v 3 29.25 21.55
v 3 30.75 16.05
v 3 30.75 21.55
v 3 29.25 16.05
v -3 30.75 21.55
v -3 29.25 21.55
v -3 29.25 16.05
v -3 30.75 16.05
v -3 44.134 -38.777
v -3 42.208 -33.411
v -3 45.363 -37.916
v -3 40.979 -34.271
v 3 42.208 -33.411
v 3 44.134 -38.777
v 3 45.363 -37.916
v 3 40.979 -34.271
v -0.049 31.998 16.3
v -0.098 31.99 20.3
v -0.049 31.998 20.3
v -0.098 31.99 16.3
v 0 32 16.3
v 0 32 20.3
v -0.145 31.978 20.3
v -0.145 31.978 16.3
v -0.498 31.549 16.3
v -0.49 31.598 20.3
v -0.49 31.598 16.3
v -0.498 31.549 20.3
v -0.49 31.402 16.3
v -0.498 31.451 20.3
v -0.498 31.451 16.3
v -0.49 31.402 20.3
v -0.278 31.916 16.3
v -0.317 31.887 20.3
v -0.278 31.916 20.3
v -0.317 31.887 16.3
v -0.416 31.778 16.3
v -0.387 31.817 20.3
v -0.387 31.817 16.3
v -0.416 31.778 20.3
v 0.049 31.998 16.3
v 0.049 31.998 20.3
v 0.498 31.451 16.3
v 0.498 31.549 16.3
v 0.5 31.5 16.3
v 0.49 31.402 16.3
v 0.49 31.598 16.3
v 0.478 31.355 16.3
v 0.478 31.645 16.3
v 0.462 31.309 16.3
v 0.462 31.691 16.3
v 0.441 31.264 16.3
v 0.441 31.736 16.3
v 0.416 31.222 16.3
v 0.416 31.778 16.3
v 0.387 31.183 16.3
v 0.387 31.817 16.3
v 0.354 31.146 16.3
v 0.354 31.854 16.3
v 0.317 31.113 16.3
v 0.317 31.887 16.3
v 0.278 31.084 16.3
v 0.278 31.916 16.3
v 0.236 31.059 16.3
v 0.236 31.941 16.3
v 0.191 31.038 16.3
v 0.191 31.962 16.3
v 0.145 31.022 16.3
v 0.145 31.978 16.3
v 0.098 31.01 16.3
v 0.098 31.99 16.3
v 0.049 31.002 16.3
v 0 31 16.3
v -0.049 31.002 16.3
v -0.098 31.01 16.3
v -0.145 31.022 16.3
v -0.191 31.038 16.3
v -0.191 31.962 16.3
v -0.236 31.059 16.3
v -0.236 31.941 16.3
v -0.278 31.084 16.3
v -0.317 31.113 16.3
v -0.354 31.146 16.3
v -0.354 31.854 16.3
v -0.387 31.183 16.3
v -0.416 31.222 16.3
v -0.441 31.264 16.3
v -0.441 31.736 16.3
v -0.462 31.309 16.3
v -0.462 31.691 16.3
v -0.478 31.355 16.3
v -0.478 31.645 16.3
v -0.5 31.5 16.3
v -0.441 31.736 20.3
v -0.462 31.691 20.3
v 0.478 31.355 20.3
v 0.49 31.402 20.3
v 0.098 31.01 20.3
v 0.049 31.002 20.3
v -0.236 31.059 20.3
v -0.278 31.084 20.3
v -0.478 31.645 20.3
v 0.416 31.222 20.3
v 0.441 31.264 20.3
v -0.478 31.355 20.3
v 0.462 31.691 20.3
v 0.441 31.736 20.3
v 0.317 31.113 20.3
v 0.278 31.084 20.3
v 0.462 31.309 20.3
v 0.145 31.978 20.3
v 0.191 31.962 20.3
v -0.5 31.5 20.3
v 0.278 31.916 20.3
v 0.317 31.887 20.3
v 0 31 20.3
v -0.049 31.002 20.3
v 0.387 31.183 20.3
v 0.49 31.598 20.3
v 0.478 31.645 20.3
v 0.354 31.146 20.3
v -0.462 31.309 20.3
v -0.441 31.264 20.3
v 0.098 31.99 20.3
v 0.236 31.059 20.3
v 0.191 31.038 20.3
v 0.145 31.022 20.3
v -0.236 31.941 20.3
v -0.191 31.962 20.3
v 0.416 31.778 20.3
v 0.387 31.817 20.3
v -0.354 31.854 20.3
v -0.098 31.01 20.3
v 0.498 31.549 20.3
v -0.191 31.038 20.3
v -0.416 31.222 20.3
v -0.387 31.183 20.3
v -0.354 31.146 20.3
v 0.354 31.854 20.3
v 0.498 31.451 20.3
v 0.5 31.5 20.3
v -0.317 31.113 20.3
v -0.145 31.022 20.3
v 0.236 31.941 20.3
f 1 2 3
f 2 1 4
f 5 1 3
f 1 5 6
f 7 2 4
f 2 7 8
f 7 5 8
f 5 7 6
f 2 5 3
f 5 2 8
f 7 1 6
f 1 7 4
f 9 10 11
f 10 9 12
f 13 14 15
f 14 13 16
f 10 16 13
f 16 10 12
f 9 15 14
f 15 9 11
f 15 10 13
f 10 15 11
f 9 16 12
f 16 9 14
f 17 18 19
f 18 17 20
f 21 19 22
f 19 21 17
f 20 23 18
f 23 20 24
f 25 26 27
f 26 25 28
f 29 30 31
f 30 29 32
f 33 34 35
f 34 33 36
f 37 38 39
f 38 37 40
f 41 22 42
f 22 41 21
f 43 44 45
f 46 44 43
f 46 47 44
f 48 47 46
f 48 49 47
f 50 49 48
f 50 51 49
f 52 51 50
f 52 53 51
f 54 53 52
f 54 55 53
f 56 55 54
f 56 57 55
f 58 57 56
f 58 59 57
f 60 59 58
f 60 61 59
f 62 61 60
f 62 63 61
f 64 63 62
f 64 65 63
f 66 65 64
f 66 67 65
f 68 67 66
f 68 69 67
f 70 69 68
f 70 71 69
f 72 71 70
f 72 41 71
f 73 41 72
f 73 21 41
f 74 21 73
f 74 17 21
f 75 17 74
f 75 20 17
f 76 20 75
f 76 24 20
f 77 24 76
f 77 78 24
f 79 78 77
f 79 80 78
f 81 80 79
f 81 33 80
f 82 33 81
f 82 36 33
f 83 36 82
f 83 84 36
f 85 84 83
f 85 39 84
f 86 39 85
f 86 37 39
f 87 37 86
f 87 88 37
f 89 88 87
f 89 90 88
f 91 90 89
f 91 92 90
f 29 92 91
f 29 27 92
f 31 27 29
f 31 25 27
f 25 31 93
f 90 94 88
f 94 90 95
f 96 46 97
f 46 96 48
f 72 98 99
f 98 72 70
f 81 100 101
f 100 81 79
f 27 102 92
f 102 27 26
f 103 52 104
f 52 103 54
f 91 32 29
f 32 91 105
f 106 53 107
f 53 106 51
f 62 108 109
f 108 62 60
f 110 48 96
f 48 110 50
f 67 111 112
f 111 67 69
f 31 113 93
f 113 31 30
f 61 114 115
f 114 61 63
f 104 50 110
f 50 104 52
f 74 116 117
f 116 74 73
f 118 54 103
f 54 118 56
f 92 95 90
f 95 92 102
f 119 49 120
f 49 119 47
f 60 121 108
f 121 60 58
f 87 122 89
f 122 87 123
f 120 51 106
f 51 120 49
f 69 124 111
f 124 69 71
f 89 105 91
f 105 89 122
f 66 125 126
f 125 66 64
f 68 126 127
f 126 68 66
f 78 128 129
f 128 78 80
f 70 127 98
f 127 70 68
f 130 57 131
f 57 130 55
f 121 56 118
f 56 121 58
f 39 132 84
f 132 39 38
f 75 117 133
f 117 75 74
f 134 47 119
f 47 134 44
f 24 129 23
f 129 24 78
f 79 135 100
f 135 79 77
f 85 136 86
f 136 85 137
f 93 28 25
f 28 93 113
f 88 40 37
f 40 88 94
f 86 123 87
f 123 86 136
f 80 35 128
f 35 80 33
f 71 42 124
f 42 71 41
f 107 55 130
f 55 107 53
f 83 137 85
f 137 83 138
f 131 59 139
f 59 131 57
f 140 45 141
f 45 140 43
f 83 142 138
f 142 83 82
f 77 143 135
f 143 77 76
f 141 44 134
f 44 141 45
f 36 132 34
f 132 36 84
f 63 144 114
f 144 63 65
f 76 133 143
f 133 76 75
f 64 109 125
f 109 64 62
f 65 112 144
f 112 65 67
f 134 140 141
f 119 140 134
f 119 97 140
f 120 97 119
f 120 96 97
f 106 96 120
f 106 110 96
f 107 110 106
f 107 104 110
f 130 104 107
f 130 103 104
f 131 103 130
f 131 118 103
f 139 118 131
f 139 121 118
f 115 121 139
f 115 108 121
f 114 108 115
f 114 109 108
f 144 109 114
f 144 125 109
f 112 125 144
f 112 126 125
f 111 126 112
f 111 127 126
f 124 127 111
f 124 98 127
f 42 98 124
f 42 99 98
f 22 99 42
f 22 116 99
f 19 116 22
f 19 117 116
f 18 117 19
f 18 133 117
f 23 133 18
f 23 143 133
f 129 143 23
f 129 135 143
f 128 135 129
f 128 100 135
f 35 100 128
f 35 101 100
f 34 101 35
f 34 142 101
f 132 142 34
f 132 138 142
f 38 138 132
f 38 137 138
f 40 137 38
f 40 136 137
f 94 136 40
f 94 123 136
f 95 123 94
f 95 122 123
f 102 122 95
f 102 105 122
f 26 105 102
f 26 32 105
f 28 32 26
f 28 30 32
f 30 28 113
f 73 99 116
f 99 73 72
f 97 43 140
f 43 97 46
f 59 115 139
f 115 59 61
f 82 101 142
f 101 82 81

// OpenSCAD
// file: ../wattplot_params.scad
// =============================================================================
// wattplot_params.scad -- mirror of wattplot_params.py
// =============================================================================
//
// DO NOT EDIT THESE NUMBERS WITHOUT UPDATING wattplot_params.py AND
// firmware/tests/test_openscad_params.py.
//
// The Python source of truth is wattplot_params.py at the repo root.
// This file is a hand-maintained mirror so the OpenSCAD models can
// render without Python. A CI test (test_openscad_params.py) reads
// both and fails if any number has drifted.
//
// If you change a value here, change it in wattplot_params.py first
// and update the test expectations in test_openscad_params.py. The
// commit message should reference the param name (e.g.
// "scad: bump POSTS.height_in to 78 for v3.1 storm margin").
//
// All dimensions are in inches. OpenSCAD's $fn controls mesh
// resolution -- 64 gives a clean STL that's about 2 MB at this
// model's complexity.

// ---------- LOCATION ----------
location_latitude  = 33.45;     // Phoenix, AZ
location_longitude = -112.07;
location_elevation_m = 337;
location_design_wind_mph = 115.0; // ASCE 7-22, Risk Cat II 700-yr

// ---------- PLANTER LIMITS ----------
max_planter_L_in = 96.0;          // 8 ft stock, no waste on long rails
max_planter_W_in = 60.0;          // 5 ft (8 ft cross-cut, 2 cross-rails per board)

// ---------- BED (planter, ballasted) ----------
bed_outer_L_in       = 96.0;       // 8 ft (capped at max_planter_L_in)
bed_outer_W_in       = 44.6;       // matches panel width
bed_wall_thk_in      = 0.75;       // 1x6 cedar (3/4" actual)
bed_wall_h_in        = 27.5;       // 5 courses of 1x6 (5.5" actual)
                                   //   wind-sized: SF_overturning 2.55 at 35°
bed_soil_fill_in     = 25.5;       // 2" freeboard below the rim
                                   //   ~60 cu ft = 2.2 cu yd = ~4,000 lb
bed_skid_h_in        = 1.5;        // walls rest on 2x4 footers
bed_skid_side_in     = 3.5;        // 4x nominal

// ---------- BED WALL (1x6 cedar skin over 2x4 cleats) ----------
wall_skin_thk_in   = 0.75;
wall_course_h_in   = 5.5;
wall_courses       = 5;            // 5 x 5.5" = 27.5" wall
wall_cleat_thk_in  = 1.5;          // 2x4 actual
wall_cleat_wid_in  = 3.5;          // 2x4 actual
wall_cleats_long   = 5;            // per long wall
wall_cleats_short  = 3;            // per short wall
wall_header_thk_in = 1.5;         // 2x4 on wide face
wall_header_wid_in = 3.5;

// ---------- POSTS (4x4 PT, 72" tall, walk-under canopy) ----------
post_thk_in  = 3.5;               // 4x4 actual
post_height_in = 72.0;            // 6 ft -- walk-under / reach-under
post_count   = 4;
post_rail_thk_in = 1.5;          // 2x6 on post tops
post_rail_wid_in = 5.5;

// ---------- PANEL (LONGi Hi-MO X10 620W default) ----------
panel_L_in        = 97.0;         // 8.08 ft (overhangs bed 0.5"/side)
panel_W_in        = 44.6;         // 3.72 ft
panel_thk_in      = 1.4;
panel_mass_lb     = 65.0;
panel_wattage     = 620;
panel_tilt_deg    = 35.0;         // 0 = flat, 35 = max (wind-limited)

// ---------- CONTROL (tilt cap + PI setpoint) ----------
control_max_tilt_deg  = 35.0;     // STRUCTURAL cap. See ADR-001.
control_target_current_A = 0.5;
control_hard_current_limit_A = 2.5;

// ---------- FRAME (perimeter around the panel) ----------
frame_long_rail_thk_in   = 1.5;    // 2x6 actual
frame_long_rail_wid_in   = 5.5;
frame_long_rail_length_in = 96.0;  // 8 ft stock, no waste

frame_cross_rail_thk_in   = 1.5;   // 2x6 actual
frame_cross_rail_wid_in   = 5.5;
frame_cross_rail_length_in = 42.0; // 2x6x8ft cut to 42"

frame_brace_thk_in   = 1.5;         // 2x4 actual
frame_brace_wid_in   = 3.5;
frame_brace_length_in = 102.0;     // 2x4x10ft cut to 102"

// ---------- HINGES + PANEL CLAMPS ----------
hinge_leaf_in    = 4.0;            // 4"x4" leaf, 1/2" pin
hinge_pin_d_in    = 0.5;
hinge_count      = 4;
hinge_spacing_in = 22.0;           // 22" o.c.
hinge_rod_length_in = 72.0;        // 1/2" x 72" steel rod (HD)

panel_clamp_length_in = 2.0;       // IronRidge mid-clamp, 35mm channel
panel_clamp_height_in = 2.0;
panel_clamp_thk_in   = 0.4;
panel_clamps_per_long_rail  = 2;
panel_clamps_per_cross_rail = 1;

// ---------- ACTUATOR MOUNT ----------
actuator_block_thk_in  = 1.5;      // 2x6 actual
actuator_block_wid_in  = 5.5;
actuator_block_length_in = 6.0;
actuator_stroke_in     = 4.0;       // 12V linear actuator
actuator_width_in      = 2.0;       // body width (for clearance check)
actuator_height_in     = 2.5;

// ---------- DERIVED (don't change) ----------
// Bed is sized so the panel overhangs the rails by 0.5" per side.
// The panel mid-clamps grip the aluminum frame, not the glass.
bed_inner_L_in = bed_outer_L_in - 2 * post_thk_in;
bed_inner_W_in = bed_outer_W_in - 2 * wall_skin_thk_in;
// Wall sits on top of skid; rim = wall + skid.
bed_rim_h_in = bed_wall_h_in + bed_skid_h_in;
// Panel frame offset above the bed rail (clearance for the clamp).
panel_clearance_in = 2.0;         // 2" above the rail top

// Render resolution: $fn controls segment count for curves.
// 64 gives a clean STL ~2 MB. Lower for fast preview, higher for
// 3D printing.
$fn = 64;
// main file
// =============================================================================
// parts/actuator.scad -- the linear actuator + 2 clevis blocks
// =============================================================================
//
// 12V, 4" stroke, 330 lb. Mounted between the bed's north wall (clevis
// block) and the frame's north rail (clevis block). Tilts with the
// frame on the rail side; fixed on the bed side.

include <../wattplot_params.scad>

module actuator_assembly() {
    hinge_y = bed_rim_h_in + 0.5;
    hinge_z = -bed_outer_W_in/2 + 0.5;
    panel_pivot_x = 0;
    // Clevis block on the bed's north wall (fixed -- doesn't tilt)
    color(col_actuator_default)
    translate([0, bed_rim_h_in + 1.0, bed_outer_W_in/2 - wall_skin_thk_in - actuator_block_wid_in/2])
        cube([actuator_block_length_in, actuator_block_thk_in, actuator_block_wid_in], center=true);
    // Clevis block on the frame's north rail (moves with the frame)
    color(col_actuator_default)
    translate([panel_pivot_x, hinge_y, hinge_z])
        rotate([panel_tilt_deg, 0, 0])
        translate([0, panel_clearance_in + 1.0, -bed_outer_W_in/2 + actuator_block_wid_in/2])
            cube([actuator_block_length_in, actuator_block_thk_in, actuator_block_wid_in], center=true);
    // The actuator body itself: visualized as a cylinder between
    // the two clevis blocks. Real actuator is a 12V worm-drive
    // unit; we model it as a cylinder for visual scale only.
    color(col_actuator_default)
    translate([0, bed_rim_h_in + 1.0 + 1.5, bed_outer_W_in/2 - wall_skin_thk_in - actuator_block_wid_in/2 - 0.5])
        rotate([0, 0, 90])
            cylinder(h=actuator_stroke_in, d=1.0, center=true);
}

col_actuator_default = [0.40, 0.40, 0.45];

if (is_undef($use_only)) {
    $fn = 64;
    actuator_assembly();
}
